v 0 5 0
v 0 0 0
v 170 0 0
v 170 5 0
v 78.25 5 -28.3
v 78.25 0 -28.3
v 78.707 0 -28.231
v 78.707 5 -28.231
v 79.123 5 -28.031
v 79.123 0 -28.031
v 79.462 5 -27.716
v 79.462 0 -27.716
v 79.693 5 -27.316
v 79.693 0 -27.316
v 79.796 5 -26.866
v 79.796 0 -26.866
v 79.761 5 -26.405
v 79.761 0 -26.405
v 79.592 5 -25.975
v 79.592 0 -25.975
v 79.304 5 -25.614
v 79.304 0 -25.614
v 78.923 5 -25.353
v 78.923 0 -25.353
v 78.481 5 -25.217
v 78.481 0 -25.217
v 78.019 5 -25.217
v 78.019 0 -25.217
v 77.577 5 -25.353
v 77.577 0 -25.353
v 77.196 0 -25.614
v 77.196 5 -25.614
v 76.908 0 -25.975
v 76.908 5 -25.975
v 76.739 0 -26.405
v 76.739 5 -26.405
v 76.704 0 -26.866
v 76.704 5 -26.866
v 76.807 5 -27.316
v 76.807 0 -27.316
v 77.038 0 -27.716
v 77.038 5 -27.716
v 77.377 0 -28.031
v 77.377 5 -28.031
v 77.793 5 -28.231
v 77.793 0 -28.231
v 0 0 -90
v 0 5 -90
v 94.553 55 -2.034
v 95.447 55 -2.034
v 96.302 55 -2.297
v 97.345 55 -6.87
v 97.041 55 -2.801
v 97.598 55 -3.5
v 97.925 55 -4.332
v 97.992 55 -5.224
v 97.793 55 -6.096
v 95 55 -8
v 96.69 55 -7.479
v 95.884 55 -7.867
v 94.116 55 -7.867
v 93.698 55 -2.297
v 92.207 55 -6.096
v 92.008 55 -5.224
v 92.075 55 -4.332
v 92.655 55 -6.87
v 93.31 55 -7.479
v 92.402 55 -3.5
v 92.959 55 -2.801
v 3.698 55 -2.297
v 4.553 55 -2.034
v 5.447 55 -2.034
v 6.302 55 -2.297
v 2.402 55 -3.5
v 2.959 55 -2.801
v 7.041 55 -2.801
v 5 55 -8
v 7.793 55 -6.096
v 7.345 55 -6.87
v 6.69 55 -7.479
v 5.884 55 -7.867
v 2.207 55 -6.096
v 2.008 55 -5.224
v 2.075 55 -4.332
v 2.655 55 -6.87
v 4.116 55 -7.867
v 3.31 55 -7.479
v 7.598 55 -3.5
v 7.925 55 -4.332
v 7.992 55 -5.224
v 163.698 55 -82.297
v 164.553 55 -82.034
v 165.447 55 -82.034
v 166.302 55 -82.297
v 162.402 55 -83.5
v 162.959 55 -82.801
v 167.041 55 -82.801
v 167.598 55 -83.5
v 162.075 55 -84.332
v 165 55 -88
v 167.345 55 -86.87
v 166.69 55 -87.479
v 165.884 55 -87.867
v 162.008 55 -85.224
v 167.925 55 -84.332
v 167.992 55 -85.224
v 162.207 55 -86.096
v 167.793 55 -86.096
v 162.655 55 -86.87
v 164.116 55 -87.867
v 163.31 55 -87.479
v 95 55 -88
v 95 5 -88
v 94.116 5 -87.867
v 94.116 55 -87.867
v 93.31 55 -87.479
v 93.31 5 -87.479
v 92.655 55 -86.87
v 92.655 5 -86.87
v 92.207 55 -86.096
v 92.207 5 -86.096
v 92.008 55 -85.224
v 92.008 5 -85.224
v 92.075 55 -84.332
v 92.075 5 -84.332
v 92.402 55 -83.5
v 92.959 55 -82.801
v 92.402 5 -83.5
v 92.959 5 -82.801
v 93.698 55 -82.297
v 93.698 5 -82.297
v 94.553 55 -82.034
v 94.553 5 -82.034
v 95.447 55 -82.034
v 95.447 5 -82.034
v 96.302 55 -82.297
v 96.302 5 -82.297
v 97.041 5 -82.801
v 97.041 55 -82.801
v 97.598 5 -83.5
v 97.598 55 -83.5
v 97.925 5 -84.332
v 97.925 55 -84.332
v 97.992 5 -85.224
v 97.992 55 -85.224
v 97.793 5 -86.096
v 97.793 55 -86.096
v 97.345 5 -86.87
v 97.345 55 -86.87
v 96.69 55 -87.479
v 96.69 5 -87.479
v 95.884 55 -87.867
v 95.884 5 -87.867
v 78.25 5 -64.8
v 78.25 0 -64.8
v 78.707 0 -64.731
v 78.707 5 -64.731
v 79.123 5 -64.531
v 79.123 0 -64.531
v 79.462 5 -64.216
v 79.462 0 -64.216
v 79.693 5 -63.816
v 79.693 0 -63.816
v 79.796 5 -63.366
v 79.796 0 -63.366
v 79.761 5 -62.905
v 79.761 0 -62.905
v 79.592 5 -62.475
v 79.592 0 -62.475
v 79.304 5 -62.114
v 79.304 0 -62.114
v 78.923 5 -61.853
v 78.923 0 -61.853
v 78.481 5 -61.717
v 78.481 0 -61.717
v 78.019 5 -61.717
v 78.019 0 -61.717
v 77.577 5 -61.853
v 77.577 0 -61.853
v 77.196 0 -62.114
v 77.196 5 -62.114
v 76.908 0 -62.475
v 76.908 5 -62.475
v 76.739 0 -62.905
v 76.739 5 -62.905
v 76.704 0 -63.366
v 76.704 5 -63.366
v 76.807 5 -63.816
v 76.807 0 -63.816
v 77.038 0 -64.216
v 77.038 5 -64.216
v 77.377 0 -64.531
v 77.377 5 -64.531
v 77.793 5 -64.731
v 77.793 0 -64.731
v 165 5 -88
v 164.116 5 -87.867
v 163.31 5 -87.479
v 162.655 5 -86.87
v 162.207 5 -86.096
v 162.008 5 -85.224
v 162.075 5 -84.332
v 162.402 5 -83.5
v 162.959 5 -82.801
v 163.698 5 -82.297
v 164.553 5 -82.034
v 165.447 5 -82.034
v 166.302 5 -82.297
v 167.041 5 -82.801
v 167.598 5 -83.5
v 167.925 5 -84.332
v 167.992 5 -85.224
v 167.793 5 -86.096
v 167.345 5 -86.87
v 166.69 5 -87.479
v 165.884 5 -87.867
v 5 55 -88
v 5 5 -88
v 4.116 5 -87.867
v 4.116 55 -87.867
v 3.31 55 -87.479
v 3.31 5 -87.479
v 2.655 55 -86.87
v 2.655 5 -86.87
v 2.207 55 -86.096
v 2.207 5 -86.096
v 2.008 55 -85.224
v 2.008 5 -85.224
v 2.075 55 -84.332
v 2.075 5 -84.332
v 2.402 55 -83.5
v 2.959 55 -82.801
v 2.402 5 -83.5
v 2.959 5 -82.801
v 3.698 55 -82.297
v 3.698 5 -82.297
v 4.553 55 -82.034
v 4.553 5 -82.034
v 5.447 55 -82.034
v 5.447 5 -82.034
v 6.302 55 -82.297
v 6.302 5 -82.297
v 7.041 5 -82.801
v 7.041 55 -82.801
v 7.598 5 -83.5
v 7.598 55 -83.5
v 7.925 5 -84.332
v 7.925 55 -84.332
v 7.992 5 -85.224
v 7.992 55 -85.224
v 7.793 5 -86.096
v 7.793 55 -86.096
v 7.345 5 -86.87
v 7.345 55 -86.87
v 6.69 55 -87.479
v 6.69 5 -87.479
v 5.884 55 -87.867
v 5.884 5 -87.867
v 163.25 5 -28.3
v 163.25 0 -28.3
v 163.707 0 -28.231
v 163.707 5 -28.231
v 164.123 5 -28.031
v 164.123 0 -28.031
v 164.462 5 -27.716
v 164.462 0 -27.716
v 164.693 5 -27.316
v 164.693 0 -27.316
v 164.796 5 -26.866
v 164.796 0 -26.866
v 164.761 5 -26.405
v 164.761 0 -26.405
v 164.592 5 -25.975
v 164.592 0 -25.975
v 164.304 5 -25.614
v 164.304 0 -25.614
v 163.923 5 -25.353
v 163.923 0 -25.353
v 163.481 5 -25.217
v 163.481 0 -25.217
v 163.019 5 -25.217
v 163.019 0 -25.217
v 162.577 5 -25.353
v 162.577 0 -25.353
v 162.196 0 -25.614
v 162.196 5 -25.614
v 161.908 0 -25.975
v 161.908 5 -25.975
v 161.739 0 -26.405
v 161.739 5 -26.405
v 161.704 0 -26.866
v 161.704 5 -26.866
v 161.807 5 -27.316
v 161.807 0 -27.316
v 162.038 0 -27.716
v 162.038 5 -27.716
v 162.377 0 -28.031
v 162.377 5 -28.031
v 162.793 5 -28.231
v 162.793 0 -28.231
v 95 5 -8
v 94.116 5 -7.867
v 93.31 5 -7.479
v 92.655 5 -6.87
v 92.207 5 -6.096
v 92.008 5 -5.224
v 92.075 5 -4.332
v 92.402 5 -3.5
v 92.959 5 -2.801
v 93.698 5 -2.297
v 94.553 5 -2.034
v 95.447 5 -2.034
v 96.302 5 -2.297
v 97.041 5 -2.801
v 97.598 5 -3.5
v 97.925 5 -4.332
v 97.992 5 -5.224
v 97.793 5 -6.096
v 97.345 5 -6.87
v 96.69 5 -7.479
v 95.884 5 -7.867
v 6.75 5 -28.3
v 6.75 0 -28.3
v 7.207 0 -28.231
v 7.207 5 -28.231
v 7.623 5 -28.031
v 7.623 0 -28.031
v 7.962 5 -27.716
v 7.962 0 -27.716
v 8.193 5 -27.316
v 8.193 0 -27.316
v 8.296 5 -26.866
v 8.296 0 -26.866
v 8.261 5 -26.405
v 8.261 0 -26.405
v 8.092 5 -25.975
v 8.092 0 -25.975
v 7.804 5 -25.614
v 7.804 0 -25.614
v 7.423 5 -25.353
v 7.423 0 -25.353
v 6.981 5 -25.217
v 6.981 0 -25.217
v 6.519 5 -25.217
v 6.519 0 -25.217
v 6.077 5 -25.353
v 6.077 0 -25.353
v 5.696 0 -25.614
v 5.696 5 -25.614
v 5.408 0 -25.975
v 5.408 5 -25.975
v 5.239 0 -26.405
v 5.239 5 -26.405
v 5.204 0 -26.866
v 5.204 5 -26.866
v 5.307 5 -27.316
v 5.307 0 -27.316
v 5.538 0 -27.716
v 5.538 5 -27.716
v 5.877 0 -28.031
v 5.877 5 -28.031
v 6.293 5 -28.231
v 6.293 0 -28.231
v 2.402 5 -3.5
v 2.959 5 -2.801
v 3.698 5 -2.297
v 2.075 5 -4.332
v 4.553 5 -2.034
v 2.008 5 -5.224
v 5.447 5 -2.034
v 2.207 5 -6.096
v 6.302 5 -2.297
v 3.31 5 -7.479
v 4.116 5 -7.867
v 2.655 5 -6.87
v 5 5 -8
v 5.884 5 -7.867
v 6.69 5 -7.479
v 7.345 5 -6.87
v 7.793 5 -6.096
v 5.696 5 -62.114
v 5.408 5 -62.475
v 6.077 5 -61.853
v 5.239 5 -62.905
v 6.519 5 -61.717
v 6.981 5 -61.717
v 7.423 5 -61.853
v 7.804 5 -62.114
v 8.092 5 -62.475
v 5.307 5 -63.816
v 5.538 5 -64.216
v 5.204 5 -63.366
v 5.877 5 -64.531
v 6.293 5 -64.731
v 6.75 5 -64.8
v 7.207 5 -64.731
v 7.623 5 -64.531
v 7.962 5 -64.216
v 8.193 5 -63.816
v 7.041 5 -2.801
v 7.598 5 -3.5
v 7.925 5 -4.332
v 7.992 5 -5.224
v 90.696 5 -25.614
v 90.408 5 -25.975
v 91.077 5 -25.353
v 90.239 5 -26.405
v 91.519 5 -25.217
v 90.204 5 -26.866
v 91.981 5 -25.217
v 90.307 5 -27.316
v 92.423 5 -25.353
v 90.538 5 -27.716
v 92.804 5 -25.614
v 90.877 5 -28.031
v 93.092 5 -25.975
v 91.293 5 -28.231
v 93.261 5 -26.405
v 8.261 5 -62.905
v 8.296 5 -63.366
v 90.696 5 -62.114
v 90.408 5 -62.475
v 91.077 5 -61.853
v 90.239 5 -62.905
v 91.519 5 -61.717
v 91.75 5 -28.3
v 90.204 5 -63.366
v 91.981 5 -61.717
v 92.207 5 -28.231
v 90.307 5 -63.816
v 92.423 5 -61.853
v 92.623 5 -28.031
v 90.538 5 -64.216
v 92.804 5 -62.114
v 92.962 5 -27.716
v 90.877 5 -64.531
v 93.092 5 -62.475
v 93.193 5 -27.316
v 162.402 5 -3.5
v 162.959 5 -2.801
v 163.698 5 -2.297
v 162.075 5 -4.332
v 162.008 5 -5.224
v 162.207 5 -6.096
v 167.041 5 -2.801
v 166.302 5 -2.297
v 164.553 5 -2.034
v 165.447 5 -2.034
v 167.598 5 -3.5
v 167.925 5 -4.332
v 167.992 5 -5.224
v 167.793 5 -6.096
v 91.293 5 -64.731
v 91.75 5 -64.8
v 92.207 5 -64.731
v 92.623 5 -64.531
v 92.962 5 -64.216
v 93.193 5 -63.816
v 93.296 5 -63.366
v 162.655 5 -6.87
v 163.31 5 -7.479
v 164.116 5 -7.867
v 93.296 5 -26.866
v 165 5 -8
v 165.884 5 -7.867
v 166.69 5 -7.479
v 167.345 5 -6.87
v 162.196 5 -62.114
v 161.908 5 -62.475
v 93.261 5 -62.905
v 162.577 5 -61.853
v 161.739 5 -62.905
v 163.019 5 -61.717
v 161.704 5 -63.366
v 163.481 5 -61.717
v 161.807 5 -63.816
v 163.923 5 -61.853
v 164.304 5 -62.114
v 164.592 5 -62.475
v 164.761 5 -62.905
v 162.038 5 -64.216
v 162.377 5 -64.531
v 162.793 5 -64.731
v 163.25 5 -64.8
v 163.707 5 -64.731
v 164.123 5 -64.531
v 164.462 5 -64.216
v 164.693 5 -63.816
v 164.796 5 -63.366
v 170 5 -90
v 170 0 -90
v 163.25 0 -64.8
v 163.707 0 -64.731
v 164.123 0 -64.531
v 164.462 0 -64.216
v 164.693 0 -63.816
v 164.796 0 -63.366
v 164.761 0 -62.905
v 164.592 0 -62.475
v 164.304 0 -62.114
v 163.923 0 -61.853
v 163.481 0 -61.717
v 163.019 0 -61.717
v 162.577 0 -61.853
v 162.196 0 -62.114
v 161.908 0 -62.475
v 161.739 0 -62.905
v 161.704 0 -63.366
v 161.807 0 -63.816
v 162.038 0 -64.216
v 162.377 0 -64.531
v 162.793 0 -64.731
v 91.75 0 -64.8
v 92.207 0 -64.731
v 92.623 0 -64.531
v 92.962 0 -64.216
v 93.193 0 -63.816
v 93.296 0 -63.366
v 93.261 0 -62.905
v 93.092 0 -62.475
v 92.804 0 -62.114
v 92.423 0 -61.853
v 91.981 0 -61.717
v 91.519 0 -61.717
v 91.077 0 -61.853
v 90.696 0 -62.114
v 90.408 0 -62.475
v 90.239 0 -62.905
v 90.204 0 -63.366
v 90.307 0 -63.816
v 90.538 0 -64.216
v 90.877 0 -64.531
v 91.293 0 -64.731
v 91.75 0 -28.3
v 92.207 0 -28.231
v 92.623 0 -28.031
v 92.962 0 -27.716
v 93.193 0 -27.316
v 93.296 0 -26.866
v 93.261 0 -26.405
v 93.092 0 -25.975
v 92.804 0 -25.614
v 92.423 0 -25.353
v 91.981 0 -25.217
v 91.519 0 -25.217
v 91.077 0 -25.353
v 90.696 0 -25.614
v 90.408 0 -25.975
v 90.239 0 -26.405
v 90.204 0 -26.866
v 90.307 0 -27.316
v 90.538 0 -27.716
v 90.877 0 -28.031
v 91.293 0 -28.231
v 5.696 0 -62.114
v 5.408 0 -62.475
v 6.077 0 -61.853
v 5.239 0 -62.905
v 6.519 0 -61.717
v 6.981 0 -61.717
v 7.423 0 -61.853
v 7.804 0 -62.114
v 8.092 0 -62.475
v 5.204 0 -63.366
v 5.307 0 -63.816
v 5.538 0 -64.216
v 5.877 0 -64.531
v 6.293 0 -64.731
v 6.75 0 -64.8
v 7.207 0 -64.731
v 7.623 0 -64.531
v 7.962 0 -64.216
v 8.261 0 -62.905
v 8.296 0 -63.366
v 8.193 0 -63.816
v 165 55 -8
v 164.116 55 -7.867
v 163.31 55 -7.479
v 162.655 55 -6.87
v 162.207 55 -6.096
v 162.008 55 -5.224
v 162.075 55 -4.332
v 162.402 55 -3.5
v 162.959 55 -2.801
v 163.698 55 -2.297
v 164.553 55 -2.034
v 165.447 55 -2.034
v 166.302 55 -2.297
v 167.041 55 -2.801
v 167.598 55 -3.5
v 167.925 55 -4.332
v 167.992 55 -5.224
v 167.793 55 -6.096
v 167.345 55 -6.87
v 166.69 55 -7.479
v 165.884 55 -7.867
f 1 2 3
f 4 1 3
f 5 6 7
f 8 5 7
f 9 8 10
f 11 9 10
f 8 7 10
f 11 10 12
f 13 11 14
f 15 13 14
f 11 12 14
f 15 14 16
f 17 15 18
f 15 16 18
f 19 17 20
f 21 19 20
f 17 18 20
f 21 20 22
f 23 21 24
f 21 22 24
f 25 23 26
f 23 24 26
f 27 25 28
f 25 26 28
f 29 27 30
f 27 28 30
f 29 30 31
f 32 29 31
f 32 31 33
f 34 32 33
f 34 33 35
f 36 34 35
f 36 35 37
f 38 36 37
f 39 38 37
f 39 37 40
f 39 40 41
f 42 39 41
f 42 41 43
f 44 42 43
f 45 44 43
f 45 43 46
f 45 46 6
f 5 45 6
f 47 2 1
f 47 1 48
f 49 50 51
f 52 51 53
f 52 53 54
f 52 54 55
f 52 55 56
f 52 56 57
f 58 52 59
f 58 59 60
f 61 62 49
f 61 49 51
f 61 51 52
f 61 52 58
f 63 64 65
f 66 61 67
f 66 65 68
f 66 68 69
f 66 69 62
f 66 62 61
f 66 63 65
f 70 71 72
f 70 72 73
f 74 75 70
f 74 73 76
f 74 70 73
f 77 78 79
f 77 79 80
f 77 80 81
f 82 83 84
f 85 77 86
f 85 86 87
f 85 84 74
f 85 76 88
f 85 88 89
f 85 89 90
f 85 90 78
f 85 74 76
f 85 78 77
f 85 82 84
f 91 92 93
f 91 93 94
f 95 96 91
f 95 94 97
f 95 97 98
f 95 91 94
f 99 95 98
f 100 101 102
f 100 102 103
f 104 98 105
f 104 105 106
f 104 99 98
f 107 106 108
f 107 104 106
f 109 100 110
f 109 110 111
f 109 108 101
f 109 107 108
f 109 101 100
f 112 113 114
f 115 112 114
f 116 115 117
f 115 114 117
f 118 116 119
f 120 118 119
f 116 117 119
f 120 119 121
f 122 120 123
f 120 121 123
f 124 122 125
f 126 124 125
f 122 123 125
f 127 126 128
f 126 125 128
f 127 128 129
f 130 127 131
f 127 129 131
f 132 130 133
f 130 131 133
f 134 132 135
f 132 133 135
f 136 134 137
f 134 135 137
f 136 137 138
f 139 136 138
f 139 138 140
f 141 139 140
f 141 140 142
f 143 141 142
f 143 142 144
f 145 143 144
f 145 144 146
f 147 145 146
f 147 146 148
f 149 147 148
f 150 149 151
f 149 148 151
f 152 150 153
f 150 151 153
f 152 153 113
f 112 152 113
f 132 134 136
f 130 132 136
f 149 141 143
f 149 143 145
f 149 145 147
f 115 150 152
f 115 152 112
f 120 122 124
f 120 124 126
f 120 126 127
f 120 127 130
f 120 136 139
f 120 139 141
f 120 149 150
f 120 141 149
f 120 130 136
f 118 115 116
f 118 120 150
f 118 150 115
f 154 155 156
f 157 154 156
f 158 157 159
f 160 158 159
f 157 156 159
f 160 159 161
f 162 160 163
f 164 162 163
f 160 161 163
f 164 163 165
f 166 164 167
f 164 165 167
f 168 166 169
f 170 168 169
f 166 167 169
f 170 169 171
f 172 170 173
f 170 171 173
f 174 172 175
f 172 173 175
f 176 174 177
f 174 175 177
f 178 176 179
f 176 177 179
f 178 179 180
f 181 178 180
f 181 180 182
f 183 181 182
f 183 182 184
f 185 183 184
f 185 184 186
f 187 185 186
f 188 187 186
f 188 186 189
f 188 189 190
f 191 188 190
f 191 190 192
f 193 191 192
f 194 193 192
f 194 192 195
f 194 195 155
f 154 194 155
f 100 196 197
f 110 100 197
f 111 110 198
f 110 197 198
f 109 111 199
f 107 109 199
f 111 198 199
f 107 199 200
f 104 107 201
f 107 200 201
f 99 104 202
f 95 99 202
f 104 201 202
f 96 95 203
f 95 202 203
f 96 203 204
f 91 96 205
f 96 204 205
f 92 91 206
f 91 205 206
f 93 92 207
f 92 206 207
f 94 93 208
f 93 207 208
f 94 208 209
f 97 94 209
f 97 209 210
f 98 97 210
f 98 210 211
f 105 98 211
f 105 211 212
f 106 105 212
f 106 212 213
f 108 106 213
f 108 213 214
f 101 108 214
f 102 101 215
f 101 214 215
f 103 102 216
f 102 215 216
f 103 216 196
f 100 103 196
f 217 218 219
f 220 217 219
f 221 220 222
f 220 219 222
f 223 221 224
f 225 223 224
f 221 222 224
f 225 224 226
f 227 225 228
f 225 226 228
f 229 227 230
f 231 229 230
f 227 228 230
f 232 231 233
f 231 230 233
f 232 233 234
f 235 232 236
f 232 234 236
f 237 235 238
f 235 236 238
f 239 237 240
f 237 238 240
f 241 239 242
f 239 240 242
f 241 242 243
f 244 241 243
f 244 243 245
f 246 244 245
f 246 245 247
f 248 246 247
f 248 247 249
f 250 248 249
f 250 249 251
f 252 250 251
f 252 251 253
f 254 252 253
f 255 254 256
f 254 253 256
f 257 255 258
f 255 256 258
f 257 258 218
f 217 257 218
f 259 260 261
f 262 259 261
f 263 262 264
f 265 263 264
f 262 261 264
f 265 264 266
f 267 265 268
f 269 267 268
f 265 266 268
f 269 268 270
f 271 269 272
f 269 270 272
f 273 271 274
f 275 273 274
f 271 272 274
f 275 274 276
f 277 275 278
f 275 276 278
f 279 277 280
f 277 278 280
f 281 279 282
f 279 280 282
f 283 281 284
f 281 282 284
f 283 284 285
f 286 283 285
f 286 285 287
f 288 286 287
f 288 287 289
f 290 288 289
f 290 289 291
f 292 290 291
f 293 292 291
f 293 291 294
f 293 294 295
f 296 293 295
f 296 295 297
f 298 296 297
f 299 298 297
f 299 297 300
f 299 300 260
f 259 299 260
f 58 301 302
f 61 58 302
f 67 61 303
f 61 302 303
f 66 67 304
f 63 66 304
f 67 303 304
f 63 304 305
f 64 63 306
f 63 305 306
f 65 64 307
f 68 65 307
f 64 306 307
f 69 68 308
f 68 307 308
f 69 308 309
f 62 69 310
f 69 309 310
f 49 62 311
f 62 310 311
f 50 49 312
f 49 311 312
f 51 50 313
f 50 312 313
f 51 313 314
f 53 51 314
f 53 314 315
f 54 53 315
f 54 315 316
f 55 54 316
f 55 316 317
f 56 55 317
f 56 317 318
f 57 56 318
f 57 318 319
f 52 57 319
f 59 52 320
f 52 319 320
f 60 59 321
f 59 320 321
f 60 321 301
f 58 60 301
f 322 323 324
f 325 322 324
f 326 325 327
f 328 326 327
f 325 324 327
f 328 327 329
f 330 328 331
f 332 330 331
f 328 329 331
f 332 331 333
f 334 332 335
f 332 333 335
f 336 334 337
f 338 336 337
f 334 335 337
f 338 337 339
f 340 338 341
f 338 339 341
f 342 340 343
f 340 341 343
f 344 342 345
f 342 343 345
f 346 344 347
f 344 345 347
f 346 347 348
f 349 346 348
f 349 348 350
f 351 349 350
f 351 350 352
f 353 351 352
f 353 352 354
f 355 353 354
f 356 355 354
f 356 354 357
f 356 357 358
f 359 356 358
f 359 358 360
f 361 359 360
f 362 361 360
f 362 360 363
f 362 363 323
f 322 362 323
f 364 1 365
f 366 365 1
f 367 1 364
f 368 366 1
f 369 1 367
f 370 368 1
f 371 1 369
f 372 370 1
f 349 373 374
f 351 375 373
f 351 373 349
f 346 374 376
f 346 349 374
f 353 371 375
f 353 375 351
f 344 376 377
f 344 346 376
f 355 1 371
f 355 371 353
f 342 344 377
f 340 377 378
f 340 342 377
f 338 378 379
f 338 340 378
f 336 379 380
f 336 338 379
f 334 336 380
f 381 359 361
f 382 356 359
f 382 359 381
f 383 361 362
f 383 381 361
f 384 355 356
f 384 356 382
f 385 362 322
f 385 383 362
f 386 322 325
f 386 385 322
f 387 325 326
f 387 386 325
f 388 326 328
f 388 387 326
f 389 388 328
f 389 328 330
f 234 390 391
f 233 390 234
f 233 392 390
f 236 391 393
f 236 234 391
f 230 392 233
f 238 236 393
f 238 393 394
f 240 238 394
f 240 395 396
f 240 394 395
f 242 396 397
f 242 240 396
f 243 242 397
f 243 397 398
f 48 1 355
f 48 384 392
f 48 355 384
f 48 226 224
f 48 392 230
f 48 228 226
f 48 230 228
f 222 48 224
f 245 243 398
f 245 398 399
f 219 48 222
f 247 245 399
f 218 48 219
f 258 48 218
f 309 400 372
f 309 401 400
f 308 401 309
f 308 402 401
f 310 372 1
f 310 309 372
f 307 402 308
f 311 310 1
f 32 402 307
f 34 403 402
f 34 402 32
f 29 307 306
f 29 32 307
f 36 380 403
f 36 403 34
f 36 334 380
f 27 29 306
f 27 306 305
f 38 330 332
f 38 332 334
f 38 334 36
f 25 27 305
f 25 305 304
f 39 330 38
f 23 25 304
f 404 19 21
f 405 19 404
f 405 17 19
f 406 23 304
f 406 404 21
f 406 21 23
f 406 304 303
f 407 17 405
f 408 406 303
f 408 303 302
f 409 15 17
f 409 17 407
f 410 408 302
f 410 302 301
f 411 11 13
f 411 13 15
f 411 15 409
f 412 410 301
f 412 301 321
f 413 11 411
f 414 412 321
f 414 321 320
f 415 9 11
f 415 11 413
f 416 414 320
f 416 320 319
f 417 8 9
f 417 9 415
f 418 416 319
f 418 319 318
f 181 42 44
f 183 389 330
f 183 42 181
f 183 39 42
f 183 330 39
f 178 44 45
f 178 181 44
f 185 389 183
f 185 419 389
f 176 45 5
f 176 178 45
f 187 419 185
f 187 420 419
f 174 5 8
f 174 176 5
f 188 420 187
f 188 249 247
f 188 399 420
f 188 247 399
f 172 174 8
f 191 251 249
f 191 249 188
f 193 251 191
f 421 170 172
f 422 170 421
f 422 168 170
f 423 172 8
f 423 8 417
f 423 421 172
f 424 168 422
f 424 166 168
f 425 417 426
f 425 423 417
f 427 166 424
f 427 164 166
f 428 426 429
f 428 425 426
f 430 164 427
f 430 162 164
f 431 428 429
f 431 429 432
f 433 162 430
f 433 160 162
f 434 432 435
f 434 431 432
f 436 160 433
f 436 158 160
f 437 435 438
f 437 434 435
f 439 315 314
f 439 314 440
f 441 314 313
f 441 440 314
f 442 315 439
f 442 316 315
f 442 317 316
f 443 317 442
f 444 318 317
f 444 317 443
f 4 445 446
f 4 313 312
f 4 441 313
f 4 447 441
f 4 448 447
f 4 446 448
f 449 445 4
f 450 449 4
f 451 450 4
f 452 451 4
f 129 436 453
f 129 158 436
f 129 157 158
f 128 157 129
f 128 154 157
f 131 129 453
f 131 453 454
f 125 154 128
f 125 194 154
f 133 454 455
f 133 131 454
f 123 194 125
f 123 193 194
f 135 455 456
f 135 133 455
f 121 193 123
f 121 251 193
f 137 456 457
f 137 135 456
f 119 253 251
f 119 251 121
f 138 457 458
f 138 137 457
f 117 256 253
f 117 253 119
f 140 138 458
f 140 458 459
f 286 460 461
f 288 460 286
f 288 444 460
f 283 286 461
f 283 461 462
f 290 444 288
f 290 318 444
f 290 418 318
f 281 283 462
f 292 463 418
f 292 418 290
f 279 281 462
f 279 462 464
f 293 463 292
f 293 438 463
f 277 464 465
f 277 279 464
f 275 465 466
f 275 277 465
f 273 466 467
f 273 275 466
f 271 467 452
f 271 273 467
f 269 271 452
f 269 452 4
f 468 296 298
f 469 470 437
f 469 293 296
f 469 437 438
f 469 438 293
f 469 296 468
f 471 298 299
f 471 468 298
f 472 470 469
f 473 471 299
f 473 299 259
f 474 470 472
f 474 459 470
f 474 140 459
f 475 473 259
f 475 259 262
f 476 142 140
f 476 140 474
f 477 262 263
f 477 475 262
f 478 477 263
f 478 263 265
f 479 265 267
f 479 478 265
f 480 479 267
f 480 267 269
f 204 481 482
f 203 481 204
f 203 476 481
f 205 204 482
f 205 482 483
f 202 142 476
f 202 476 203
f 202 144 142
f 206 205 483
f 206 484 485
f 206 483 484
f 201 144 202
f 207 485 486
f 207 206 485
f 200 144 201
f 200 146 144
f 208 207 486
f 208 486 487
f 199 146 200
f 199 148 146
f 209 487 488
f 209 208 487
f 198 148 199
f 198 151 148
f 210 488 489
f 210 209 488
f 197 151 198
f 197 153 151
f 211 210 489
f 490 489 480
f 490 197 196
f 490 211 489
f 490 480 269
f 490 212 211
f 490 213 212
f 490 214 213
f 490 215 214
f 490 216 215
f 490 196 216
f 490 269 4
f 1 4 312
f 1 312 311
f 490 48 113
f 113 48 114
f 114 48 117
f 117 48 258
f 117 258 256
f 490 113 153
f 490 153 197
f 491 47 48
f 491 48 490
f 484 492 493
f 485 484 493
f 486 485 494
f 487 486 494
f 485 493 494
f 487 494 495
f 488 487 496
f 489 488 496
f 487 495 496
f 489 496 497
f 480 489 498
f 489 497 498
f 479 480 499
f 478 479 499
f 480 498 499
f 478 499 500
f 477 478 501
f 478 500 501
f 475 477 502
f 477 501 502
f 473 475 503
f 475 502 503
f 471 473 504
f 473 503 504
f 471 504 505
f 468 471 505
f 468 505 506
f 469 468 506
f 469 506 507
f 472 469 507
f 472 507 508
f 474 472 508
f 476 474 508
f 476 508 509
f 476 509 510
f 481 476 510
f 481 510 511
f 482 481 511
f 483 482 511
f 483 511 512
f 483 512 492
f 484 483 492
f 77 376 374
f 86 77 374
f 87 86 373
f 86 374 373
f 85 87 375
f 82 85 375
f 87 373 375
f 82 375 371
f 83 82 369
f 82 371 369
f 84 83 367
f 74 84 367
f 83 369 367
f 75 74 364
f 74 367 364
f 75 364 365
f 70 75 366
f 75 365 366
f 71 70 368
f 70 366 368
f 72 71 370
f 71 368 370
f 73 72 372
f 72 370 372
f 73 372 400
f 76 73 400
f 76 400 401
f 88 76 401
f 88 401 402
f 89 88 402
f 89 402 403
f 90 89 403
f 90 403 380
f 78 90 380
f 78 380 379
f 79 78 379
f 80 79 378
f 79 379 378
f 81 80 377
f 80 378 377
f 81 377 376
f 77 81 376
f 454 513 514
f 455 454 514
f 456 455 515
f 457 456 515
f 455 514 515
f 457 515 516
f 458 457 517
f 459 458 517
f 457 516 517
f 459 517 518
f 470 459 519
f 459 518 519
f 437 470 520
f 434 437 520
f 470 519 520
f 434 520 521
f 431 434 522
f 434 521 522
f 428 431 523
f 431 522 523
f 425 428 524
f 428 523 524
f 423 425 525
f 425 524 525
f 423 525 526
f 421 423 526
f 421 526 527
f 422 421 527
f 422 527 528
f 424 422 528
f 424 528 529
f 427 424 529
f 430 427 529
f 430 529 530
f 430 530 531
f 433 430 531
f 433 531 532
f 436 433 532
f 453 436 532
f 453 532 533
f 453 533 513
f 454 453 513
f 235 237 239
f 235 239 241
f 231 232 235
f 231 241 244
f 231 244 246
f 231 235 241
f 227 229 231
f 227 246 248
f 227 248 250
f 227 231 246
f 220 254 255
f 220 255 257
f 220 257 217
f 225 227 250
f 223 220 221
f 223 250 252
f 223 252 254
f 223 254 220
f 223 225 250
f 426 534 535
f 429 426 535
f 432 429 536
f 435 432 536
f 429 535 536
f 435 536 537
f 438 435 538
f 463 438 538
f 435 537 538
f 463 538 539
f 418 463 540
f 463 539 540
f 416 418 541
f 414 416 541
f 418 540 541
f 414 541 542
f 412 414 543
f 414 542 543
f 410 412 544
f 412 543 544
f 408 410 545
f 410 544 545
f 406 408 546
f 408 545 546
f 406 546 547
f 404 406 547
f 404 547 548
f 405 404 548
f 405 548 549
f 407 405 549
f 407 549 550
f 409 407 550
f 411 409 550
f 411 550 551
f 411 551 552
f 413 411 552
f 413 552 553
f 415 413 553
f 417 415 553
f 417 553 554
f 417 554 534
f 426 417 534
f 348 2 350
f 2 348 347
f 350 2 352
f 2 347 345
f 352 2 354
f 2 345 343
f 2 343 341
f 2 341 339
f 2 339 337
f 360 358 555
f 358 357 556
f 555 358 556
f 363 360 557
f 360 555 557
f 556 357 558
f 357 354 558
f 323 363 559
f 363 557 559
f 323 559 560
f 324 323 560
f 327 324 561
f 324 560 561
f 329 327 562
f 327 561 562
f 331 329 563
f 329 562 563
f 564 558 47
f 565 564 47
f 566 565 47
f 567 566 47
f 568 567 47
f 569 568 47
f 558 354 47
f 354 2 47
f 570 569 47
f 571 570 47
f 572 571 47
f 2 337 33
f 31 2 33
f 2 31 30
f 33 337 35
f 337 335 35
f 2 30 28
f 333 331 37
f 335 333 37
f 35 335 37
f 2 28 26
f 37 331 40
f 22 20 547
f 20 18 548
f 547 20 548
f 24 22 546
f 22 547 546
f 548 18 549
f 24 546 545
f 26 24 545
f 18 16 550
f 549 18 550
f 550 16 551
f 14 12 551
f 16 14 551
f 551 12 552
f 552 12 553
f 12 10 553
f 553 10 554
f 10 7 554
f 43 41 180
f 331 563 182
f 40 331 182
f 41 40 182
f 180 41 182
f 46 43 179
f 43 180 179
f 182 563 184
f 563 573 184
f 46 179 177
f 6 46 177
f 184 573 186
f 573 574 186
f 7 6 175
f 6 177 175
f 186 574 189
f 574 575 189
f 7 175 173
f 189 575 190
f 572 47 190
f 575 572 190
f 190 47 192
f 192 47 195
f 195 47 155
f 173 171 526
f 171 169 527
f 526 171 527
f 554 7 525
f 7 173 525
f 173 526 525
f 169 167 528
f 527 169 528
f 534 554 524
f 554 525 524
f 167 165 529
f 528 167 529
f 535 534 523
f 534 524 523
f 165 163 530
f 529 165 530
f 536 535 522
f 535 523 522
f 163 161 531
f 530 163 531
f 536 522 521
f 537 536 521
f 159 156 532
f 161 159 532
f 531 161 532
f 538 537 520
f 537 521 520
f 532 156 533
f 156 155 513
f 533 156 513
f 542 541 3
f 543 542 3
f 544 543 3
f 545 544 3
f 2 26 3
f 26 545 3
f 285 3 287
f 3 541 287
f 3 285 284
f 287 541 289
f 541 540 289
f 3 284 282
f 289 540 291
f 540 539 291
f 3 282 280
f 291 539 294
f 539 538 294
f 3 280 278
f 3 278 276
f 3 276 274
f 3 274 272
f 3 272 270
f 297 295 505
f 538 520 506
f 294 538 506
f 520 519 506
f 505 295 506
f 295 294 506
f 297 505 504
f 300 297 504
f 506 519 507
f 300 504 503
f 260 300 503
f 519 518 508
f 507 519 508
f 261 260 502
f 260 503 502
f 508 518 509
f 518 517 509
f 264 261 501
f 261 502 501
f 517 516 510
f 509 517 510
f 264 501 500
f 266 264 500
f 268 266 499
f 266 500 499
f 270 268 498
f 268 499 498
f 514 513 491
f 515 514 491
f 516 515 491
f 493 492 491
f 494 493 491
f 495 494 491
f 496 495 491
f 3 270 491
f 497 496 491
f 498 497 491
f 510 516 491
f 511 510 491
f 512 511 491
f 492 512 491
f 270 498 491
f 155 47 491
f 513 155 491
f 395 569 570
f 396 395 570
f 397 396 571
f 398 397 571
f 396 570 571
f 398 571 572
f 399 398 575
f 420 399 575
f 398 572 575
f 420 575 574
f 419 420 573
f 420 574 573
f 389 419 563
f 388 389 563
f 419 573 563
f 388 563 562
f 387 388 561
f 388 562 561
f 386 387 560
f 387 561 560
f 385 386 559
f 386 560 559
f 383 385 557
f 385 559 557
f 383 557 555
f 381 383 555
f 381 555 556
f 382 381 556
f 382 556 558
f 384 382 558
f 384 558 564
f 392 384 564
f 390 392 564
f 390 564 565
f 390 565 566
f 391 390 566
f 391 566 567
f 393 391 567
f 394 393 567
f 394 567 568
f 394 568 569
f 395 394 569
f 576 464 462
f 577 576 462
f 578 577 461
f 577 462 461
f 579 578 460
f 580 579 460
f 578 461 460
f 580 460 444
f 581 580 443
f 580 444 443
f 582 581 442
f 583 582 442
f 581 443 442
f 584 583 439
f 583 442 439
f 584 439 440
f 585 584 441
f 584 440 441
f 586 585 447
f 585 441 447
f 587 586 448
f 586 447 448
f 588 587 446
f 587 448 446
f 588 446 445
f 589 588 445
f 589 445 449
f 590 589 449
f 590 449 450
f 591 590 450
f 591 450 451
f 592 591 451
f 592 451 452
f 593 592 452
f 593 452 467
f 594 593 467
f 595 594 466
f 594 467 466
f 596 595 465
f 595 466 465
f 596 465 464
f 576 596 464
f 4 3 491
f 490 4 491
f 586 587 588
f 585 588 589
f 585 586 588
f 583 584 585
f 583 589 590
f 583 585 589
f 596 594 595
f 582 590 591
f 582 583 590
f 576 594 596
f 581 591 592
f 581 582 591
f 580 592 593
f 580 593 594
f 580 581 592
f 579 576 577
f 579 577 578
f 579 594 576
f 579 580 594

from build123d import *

# Parameters (mm, degrees)
SKETCH1_W           = 170
SKETCH1_H           = 90
BOSS_EXTRUDE1_DEPTH = 5
SKETCH2_R           = 3
BOSS_EXTRUDE2_DEPTH = 50
SKETCH3_R           = 1.55
CUT_EXTRUDE1_DEPTH  = 50


with BuildPart() as part:
    # Sketch1 → Boss-Extrude1 (new body)
    with BuildSketch(Plane(origin=(0, 0, 0), x_dir=(1, 0, 0), z_dir=(0, 1, 0))):
        with Locations((85, 45)):
            Rectangle(SKETCH1_W, SKETCH1_H)
    extrude(amount=BOSS_EXTRUDE1_DEPTH)

    # Sketch2 → Boss-Extrude2 (add)
    with BuildSketch(Plane(origin=(0, 5, 0), x_dir=(1, 0, 0), z_dir=(0, 1, 0))):
        with Locations(Location((5, 85, 0), (0, 0, 90))):
            Circle(SKETCH2_R)
        with Locations(Location((5, 5, 0), (0, 0, 90))):
            Circle(SKETCH2_R)
        with Locations(Location((165, 5, 0), (0, 0, 90))):
            Circle(SKETCH2_R)
        with Locations(Location((165, 85, 0), (0, 0, 90))):
            Circle(SKETCH2_R)
        with Locations(Location((95, 85, 0), (0, 0, 90))):
            Circle(SKETCH2_R)
        with Locations(Location((95, 5, 0), (0, 0, 90))):
            Circle(SKETCH2_R)
    extrude(amount=BOSS_EXTRUDE2_DEPTH)

    # Sketch3 → Cut-Extrude1 (cut)
    with BuildSketch(Plane.XZ):
        with Locations(Location((6.75, -26.75, 0), (0, 0, 270))):
            Circle(SKETCH3_R)
        with Locations(Location((78.25, -26.75, 0), (0, 0, 270))):
            Circle(SKETCH3_R)
        with Locations(Location((78.25, -63.25, 0), (0, 0, 270))):
            Circle(SKETCH3_R)
        with Locations(Location((6.75, -63.25, 0), (0, 0, 270))):
            Circle(SKETCH3_R)
        with Locations(Location((163.25, -63.25, 0), (0, 0, 270))):
            Circle(SKETCH3_R)
        with Locations(Location((91.75, -63.25, 0), (0, 0, 270))):
            Circle(SKETCH3_R)
        with Locations(Location((91.75, -26.75, 0), (0, 0, 270))):
            Circle(SKETCH3_R)
        with Locations(Location((163.25, -26.75, 0), (0, 0, 270))):
            Circle(SKETCH3_R)
    extrude(amount=-CUT_EXTRUDE1_DEPTH, mode=Mode.SUBTRACT)


solid = part.part
